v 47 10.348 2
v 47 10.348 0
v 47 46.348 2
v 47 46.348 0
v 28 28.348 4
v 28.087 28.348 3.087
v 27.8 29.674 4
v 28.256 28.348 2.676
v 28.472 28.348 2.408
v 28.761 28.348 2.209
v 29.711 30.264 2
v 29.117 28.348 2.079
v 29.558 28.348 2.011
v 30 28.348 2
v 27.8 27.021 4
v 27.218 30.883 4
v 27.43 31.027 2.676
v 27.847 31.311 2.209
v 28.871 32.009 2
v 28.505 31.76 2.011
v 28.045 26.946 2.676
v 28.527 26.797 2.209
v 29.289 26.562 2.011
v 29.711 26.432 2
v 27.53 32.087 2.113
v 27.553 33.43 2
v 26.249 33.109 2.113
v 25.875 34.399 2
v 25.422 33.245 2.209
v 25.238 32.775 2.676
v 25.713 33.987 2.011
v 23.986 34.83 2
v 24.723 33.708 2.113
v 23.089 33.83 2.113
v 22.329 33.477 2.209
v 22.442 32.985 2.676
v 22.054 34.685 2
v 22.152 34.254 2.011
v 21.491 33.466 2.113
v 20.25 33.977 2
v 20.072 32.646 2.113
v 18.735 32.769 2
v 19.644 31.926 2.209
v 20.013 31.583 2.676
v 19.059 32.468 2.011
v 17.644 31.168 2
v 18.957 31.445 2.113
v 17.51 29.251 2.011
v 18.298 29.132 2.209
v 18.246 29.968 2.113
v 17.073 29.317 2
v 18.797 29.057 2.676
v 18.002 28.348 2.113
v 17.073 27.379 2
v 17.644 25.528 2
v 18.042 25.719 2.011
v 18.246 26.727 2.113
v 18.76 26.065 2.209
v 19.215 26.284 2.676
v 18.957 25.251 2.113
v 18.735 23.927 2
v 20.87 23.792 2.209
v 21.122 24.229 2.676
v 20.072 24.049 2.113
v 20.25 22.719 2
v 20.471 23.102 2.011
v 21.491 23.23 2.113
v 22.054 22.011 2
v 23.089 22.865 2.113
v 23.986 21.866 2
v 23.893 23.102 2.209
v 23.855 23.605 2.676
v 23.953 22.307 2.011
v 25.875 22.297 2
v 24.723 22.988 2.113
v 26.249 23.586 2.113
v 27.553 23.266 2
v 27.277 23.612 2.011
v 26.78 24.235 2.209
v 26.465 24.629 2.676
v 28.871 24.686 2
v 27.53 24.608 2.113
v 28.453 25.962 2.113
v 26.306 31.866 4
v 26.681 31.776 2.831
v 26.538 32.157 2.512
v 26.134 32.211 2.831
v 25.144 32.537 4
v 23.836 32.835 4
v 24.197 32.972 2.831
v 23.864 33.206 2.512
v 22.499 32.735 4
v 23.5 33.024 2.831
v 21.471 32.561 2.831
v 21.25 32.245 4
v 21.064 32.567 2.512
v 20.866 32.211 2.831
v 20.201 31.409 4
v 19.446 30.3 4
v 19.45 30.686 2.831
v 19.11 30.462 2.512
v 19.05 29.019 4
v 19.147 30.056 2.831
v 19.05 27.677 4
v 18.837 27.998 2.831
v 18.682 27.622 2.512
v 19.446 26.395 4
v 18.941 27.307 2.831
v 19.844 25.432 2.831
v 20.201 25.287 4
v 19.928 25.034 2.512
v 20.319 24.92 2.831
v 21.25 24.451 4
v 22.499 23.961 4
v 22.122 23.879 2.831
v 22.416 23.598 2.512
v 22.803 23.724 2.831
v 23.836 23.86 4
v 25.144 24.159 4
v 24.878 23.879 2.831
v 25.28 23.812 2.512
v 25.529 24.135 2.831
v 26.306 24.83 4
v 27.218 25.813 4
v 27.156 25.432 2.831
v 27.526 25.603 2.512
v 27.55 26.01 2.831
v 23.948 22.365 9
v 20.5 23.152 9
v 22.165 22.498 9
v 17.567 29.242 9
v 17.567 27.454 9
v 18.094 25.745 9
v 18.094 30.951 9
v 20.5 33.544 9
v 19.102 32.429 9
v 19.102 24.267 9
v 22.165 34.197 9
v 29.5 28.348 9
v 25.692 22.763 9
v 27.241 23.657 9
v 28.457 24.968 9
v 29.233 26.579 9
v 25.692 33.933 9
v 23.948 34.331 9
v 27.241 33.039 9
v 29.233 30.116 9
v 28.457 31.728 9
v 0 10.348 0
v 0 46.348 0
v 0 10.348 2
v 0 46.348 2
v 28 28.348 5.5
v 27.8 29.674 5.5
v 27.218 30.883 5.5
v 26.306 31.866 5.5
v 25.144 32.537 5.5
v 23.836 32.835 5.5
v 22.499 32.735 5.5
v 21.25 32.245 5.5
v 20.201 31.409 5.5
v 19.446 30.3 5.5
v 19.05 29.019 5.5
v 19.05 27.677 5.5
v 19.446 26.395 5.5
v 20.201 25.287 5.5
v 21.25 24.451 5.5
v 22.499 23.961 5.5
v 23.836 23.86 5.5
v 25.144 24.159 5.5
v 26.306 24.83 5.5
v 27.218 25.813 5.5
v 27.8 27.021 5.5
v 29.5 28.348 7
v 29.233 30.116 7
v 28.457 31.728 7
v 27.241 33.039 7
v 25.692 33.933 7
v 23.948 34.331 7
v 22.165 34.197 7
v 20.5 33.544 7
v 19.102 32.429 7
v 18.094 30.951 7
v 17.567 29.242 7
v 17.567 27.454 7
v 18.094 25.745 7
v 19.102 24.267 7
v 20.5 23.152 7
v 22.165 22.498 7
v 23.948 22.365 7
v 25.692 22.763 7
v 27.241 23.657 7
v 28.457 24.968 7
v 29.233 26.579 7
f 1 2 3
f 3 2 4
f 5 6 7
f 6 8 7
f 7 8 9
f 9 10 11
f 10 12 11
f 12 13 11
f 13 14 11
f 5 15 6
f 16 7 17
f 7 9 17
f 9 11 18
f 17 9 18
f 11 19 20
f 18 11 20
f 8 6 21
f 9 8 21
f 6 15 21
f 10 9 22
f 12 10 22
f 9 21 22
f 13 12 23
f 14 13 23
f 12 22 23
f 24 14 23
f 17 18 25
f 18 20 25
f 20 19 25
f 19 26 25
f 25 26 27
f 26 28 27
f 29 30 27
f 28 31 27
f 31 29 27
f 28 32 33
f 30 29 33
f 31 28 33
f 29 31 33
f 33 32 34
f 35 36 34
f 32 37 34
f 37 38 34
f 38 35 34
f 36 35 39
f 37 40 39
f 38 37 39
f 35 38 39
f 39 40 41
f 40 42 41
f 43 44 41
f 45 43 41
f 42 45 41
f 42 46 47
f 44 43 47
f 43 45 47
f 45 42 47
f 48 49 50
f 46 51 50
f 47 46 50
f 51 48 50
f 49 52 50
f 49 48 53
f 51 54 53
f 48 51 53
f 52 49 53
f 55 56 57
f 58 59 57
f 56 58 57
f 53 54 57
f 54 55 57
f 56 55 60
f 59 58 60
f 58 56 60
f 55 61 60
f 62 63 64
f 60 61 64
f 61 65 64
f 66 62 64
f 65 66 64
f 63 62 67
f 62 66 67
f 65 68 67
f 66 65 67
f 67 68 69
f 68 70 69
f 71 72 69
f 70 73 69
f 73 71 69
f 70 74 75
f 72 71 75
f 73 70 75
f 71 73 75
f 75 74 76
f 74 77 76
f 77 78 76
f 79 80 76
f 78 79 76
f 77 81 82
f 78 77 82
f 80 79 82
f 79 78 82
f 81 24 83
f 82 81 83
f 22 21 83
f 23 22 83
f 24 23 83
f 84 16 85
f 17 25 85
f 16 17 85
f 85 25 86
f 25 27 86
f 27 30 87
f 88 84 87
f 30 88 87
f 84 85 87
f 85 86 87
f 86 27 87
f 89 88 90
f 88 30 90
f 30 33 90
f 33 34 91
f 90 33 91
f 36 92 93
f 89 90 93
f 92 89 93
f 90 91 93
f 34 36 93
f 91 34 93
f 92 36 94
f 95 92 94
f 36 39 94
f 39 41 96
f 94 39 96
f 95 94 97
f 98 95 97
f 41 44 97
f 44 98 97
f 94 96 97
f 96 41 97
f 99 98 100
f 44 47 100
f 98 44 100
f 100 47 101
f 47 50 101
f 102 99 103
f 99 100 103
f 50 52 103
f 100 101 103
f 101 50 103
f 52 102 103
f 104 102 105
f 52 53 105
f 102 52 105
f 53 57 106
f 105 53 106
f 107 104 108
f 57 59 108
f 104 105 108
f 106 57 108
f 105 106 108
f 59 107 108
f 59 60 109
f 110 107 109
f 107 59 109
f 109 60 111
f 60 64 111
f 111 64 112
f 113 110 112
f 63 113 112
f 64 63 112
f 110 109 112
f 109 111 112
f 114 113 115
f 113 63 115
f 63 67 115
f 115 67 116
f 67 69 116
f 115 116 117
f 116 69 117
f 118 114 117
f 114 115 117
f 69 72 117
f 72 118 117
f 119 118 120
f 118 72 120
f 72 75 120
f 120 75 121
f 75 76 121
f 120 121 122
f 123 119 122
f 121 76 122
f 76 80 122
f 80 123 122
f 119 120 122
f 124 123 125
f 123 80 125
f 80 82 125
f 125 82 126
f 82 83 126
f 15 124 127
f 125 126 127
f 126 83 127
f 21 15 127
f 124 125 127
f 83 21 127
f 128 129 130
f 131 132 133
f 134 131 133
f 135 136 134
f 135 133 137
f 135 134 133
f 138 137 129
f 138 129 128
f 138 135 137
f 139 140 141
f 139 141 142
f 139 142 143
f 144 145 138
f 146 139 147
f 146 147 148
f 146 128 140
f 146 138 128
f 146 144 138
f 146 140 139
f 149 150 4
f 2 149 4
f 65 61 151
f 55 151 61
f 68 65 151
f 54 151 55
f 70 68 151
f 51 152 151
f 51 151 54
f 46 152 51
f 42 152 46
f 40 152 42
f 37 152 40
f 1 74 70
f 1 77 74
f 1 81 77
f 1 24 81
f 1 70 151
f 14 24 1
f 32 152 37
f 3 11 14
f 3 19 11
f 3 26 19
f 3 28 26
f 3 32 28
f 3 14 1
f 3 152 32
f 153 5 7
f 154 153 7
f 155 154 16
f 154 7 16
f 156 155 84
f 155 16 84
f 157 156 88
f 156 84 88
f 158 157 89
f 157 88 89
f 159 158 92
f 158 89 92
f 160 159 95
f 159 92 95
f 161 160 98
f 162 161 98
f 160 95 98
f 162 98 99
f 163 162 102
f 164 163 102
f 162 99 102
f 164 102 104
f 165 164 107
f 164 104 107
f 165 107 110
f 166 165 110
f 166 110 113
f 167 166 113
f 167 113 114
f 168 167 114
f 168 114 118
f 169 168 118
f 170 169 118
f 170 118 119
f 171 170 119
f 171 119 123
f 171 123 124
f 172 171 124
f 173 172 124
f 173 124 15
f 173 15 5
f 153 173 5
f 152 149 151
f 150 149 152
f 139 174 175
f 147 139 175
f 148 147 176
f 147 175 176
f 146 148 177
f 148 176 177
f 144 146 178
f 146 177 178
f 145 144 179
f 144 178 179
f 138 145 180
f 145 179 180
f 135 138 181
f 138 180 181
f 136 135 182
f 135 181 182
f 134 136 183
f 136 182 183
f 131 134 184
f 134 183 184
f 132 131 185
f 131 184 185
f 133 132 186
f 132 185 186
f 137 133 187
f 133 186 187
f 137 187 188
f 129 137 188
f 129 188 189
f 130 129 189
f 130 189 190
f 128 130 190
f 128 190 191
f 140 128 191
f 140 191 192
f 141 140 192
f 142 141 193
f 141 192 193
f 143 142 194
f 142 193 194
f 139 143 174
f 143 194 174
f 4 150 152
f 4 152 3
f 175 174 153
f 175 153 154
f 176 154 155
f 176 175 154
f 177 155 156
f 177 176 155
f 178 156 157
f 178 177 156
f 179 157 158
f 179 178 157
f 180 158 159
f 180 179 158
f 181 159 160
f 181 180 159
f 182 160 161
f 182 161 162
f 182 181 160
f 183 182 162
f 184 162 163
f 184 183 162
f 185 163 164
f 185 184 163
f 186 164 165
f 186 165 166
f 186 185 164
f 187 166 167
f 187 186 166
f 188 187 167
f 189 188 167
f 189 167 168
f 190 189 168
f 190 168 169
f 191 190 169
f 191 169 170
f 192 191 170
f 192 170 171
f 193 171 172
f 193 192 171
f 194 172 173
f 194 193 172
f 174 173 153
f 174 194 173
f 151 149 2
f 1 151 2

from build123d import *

# Parameters (mm, degrees)
SKETCH1_W           = 47
SKETCH1_H           = 36
BOSS_EXTRUDE1_DEPTH = 2
SKETCH2_R           = 4.5
BOSS_EXTRUDE2_DEPTH = 5
SKETCH3_R           = 6
BOSS_EXTRUDE3_DEPTH = 2
FILLET1_SIZE        = 2
CHAMFER1_SIZE       = 1.5


# Some blends are built 0.0001 mm under size
with BuildPart() as part:
    # Sketch1 → Boss-Extrude1 (new body)
    with BuildSketch(Plane.XY):
        with Locations((23.5, 28.347826087)):
            Rectangle(SKETCH1_W, SKETCH1_H)
    extrude(amount=BOSS_EXTRUDE1_DEPTH)

    # Sketch2 → Boss-Extrude2 (add)
    with BuildSketch(Plane.XY.offset(2)):
        with Locations((23.5, 28.347826087)):
            Circle(SKETCH2_R)
    extrude(amount=BOSS_EXTRUDE2_DEPTH)

    # Sketch3 → Boss-Extrude3 (add)
    with BuildSketch(Plane.XY.offset(7)):
        with Locations((23.5, 28.347826087)):
            Circle(SKETCH3_R)
    extrude(amount=BOSS_EXTRUDE3_DEPTH)

    # Fillet1
    # a fillet whose section is not a circle: 2 mm, written as the material it adds along each edge
    with BuildSketch(Plane(origin=(23.5, 28.347826087, 2), x_dir=(1, 0, 0), z_dir=(0, -1, 0))) as fillet1_piece_1:
        with BuildLine():
            add(Edge.make_bspline([(4.5, FILLET1_SIZE), (4.5, FILLET1_SIZE * 0.831801948466), (4.5, FILLET1_SIZE * 0.663603896932), (4.5 + FILLET1_SIZE * 0.0716919198361, FILLET1_SIZE * 0.292893218813), (4.5 + FILLET1_SIZE * 0.292893218813, FILLET1_SIZE * 0.0716919198361), (4.5 + FILLET1_SIZE * 0.663603896932, 0), (4.5 + FILLET1_SIZE * 0.831801948466, 0), (4.5 + FILLET1_SIZE, 0)], knots=[0, 0, 0, 0, 0, 0, 0.5, 0.5, 1, 1, 1, 1, 1, 1], degree=5))
            Line((4.5 + FILLET1_SIZE, 0), (4.5, 0))
            Line((4.5, 0), (4.5, FILLET1_SIZE))
        make_face()
    revolve(axis=Axis((23.5, 28.347826087, 2), (0, 0, 1)))

    # Chamfer1
    chamfer1_edges = [part.edges().sort_by_distance(p)[0] for p in [
        (19, 28.347826087, 7),
    ]]
    chamfer(chamfer1_edges, length=CHAMFER1_SIZE - 0.0001)  # a hair under: the kernel refuses the full size


solid = part.part
